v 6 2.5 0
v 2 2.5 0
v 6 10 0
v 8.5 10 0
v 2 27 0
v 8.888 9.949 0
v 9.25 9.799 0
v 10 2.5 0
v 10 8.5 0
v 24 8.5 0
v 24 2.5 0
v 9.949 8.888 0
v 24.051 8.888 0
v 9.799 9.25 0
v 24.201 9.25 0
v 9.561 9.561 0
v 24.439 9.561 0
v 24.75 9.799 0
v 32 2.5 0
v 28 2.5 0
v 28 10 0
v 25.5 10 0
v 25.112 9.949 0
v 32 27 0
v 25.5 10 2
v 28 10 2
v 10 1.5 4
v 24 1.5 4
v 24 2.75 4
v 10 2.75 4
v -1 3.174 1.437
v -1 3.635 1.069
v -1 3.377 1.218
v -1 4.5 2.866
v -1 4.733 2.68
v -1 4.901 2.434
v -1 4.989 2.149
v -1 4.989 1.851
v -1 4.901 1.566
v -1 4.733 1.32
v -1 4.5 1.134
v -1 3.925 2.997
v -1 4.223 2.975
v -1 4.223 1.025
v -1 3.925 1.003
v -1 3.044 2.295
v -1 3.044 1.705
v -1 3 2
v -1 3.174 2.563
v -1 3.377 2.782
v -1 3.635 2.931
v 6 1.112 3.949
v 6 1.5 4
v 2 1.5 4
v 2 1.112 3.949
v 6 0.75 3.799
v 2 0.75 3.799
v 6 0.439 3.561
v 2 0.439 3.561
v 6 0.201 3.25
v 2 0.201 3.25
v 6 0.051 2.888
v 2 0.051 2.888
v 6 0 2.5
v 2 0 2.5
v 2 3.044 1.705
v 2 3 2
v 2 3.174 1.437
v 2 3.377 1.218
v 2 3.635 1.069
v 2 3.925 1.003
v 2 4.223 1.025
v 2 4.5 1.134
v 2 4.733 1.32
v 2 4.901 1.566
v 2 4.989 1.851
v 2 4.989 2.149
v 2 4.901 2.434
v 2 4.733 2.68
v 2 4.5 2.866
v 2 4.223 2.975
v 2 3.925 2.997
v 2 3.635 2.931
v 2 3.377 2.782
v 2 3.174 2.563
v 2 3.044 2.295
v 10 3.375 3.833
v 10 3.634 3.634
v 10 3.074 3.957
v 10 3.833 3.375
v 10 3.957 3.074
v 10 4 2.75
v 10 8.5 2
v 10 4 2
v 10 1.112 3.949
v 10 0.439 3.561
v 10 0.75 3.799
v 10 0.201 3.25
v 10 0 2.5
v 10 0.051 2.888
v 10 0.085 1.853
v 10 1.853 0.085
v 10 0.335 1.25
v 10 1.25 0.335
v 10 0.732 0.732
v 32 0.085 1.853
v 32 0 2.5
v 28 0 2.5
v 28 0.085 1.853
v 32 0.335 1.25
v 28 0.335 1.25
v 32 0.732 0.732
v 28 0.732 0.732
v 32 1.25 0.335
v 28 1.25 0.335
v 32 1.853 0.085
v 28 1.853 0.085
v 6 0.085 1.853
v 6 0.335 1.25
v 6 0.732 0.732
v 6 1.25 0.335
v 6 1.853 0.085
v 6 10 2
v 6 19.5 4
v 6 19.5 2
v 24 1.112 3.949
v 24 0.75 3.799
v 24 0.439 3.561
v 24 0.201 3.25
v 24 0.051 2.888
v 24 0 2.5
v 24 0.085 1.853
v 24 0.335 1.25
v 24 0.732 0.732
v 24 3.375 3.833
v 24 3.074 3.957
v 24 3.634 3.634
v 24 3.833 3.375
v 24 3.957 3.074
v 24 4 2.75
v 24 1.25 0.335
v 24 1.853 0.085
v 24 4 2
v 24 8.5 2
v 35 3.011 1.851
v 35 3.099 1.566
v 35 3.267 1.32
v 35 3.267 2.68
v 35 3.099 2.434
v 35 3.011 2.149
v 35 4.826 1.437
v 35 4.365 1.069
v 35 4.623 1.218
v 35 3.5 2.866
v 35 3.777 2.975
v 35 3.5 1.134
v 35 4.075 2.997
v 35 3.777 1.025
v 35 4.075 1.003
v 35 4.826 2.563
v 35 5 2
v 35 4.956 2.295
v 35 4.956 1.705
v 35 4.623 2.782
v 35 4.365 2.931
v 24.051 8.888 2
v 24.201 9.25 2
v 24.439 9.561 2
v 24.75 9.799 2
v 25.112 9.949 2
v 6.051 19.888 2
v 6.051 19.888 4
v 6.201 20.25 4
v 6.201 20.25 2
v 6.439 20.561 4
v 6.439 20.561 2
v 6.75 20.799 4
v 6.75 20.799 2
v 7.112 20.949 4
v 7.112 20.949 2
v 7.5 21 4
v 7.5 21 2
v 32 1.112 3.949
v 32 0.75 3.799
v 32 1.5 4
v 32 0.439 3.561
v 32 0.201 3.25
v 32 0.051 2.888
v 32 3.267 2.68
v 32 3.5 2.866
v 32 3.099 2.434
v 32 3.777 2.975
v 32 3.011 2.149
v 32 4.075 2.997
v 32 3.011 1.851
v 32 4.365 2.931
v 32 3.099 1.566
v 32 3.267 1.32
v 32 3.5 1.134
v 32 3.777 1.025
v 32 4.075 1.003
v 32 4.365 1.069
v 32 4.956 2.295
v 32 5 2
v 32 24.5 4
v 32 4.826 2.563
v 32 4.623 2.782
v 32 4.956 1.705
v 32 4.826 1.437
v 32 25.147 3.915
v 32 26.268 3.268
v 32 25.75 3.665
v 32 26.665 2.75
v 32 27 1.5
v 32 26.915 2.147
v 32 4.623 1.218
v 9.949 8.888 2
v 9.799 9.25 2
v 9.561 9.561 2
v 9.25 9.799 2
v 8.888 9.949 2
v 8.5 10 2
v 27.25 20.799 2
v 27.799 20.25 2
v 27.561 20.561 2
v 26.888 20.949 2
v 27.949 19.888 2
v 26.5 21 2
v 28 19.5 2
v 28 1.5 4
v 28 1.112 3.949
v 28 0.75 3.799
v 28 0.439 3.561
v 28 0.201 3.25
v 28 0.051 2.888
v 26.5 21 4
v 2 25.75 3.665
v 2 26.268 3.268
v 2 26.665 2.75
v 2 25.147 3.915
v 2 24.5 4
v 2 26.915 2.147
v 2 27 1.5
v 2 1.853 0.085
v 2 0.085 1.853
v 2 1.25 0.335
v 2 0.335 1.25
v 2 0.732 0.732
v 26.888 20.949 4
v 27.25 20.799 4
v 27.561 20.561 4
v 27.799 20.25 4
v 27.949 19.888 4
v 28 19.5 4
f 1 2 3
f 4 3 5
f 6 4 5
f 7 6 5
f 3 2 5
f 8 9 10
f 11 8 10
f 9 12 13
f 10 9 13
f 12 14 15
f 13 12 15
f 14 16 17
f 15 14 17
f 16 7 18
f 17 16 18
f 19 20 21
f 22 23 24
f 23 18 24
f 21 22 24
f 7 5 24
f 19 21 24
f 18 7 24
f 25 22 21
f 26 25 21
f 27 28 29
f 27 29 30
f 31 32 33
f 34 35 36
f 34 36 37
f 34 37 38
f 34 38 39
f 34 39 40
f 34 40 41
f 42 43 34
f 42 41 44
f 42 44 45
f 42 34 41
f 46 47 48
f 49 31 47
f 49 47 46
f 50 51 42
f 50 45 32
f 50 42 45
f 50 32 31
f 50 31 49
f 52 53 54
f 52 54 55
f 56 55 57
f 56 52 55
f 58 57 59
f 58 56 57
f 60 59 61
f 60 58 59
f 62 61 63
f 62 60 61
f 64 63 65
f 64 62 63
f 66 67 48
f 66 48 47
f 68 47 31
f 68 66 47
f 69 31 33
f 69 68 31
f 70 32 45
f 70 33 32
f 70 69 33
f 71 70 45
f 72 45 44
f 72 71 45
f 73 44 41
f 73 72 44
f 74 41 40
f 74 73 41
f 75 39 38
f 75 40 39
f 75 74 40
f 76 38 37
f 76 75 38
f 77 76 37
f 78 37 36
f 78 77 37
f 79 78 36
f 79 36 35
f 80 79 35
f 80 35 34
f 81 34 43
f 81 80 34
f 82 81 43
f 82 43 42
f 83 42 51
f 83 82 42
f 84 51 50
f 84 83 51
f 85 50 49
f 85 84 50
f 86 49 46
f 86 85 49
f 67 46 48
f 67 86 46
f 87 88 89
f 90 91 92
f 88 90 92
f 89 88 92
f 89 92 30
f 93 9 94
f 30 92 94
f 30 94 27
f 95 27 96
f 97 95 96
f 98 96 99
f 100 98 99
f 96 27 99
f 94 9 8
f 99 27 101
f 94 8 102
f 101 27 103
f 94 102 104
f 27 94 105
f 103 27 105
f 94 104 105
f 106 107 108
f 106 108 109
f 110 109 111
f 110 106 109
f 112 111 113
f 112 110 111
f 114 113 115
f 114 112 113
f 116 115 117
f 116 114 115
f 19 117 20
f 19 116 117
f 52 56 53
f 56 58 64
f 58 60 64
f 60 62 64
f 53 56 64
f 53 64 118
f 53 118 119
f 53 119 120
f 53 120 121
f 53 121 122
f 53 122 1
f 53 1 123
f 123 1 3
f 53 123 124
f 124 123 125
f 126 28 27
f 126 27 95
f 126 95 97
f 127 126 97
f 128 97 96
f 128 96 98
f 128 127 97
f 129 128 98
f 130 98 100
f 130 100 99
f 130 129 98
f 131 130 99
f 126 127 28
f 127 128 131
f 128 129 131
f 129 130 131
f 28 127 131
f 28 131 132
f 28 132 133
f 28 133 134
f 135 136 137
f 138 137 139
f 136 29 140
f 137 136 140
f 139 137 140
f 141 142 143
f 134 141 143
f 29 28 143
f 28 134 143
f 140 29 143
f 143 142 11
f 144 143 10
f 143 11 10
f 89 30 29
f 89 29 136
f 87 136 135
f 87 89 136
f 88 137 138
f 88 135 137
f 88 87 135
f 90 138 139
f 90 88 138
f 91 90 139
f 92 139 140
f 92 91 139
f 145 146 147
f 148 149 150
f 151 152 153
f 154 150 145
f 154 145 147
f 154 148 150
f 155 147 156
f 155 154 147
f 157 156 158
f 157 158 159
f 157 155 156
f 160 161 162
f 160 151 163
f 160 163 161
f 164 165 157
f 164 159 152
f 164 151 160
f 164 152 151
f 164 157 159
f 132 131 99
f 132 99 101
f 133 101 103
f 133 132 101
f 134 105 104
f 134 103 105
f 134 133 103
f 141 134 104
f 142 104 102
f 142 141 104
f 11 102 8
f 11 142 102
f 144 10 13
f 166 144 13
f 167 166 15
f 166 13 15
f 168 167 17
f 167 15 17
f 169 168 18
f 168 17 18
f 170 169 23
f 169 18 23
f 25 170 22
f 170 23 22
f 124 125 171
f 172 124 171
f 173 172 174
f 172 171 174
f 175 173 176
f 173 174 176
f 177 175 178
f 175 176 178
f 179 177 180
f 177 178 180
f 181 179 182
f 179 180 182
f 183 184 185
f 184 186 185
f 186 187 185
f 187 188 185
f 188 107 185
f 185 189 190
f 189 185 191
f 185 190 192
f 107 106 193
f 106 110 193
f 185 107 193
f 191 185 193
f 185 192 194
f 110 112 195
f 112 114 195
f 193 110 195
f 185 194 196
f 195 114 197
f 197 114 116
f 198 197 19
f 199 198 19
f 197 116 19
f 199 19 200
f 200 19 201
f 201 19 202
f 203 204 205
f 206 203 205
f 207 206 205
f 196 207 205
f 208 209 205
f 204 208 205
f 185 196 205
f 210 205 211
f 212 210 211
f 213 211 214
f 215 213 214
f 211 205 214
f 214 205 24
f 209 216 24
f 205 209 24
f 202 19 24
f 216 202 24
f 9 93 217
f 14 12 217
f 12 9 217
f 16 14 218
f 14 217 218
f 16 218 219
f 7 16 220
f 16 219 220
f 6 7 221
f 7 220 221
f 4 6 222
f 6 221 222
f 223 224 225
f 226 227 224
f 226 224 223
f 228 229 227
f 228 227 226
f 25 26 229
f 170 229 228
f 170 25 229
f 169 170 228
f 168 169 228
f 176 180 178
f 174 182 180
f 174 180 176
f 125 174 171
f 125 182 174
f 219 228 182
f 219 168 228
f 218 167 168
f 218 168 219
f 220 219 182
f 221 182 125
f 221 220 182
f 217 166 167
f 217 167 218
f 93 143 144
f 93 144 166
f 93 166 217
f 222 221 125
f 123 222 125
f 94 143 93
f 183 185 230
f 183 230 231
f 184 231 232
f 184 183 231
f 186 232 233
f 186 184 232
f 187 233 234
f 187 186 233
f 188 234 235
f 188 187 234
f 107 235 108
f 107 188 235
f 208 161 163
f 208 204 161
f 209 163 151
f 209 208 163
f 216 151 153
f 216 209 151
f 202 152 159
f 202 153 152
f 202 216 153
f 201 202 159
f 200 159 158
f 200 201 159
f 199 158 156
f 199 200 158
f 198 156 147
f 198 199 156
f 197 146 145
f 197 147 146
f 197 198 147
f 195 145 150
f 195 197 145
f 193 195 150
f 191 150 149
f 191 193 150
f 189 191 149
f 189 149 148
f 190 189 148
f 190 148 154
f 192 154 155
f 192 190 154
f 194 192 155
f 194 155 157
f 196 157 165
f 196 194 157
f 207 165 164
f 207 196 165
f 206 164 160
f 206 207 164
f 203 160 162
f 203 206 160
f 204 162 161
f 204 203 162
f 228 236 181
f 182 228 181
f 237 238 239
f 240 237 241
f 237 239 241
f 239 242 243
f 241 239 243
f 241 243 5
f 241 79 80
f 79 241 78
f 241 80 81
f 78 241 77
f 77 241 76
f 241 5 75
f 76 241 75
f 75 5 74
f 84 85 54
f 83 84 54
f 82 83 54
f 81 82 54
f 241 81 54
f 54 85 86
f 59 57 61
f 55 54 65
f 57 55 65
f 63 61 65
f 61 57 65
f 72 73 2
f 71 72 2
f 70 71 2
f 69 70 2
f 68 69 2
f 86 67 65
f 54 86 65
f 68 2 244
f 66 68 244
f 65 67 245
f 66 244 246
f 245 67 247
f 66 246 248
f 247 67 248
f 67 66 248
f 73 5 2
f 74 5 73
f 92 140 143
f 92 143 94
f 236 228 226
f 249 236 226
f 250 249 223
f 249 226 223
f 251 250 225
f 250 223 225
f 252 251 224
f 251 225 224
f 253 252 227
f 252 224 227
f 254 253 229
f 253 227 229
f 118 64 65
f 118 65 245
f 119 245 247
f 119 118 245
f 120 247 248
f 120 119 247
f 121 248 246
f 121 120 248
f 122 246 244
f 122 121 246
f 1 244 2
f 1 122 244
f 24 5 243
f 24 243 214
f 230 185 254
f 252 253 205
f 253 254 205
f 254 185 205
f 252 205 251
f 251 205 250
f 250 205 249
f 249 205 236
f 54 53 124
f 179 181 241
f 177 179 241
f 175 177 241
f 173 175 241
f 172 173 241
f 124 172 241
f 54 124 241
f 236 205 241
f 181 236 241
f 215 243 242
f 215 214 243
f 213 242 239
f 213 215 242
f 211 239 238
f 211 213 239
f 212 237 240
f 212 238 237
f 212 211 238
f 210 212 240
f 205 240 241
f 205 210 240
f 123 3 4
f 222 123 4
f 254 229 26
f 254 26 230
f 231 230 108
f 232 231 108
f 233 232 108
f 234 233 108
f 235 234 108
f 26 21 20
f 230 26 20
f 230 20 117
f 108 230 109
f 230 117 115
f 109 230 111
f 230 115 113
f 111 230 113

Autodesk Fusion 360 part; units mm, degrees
sketch "Sketch1" plane through (0, 0, 0) normal (0, 0, 1) x (1, 0, 0)
  line L0 (0, 0) -> (2, 0)
  line L1 (2, 0) -> (6, 0)
  line L2 (6, 0) -> (6, 10)
  line L3 (6, 10) -> (10, 10)
  line L4 (10, 10) -> (10, 0)
  line L5 (10, 0) -> (24, 0)
  line L6 (24, 0) -> (24, 10)
  line L7 (24, 10) -> (28, 10)
  line L8 (28, 10) -> (28, 0)
  line L9 (28, 0) -> (32, 0)
  line L10 (32, 0) -> (34, 0)
  line L11 (34, 0) -> (34, 2)
  line L12 (34, 2) -> (32, 2)
  line L13 (32, 2) -> (32, 27)
  line L14 (0, 0) -> (0, 2)
  line L15 (0, 2) -> (2, 2)
  line L16 (2, 2) -> (2, 27)
  line L17 (2, 27) -> (32, 27)
  line L18 (2, 2) -> (2, 0)
  line L19 (32, 2) -> (32, 0)
  dimension "d1" = 2
  dimension "d2" = 4
  dimension "d3" = 10
  dimension "d4" = 4
  dimension "d5" = 14
  dimension "d6" = 4
  dimension "d7" = 4
  dimension "d8" = 2
  dimension "d9" = 2
  dimension "d10" = 2
  dimension "d11" = 25
  dimension "d12" = 2
  dimension "d13" = 2
  dimension "d14" = 25
  dimension "d43" = 30
extrude "Extrude1" add sketch "Sketch1" along normal blind 4 contours L1 L2 L3 L4 L5 L6 L7 L8 L9 L13 L16 L17 L18 L19
sketch "Sketch2" plane through (32, 0, 0) normal (1, 0, 0) x (0, 1, 0)
  line L0 (0, 0) -> (27, 0)
  line L1 (27, 0) -> (27, 4)
  line L2 (27, 4) -> (0, 4)
  line L3 (0, 4) -> (0, 0)
  circle A0 centre (4, 2) radius 1
  dimension "d17" = 2
  dimension "d56" = 2
  dimension "d57" = 4
sketch "Sketch3" plane through (32, 0, 0) normal (1, 0, 0) x (0, 1, 0)
  line L0 (0, 4) -> (0, 0)
  line L1 (0, 4) -> (0, 2)
  line L2 (0, 2) -> (4.8814, 2)
  point P0 (0, 4)
extrude "Extrude2" add sketch "Sketch2" along normal blind 3 contours A0
sketch "Sketch4" plane through (2, 0, 0) normal (-1, 0, 0) x (0, -1, 0)
  line L0 (-27, 0) -> (0, 0)
  line L1 (0, 0) -> (0, 4)
  line L2 (0, 4) -> (-27, 4)
  line L3 (-27, 4) -> (-27, 0)
  circle A0 centre (-4, 2) radius 1
  line L4 (0, 0) -> (0, 2)
  dimension "d20" = 2
  dimension "d54" = 2
  dimension "d55" = 4
extrude "Extrude3" add sketch "Sketch4" along normal blind 3 contours A0
fillet "Fillet1" radius 2.5 1 edges at (17, 27, 4)
sketch "Sketch5" plane through (0, 0, 4) normal (0, 0, 1) x (-1, 0, 0)
  line L0 (-32, -24.5) -> (-2, -24.5)
  line L1 (-2, -24.5) -> (-2, 0)
  line L2 (-2, 0) -> (-6, 0)
  line L3 (-6, 0) -> (-6, -10)
  line L4 (-6, -10) -> (-10, -10)
  line L5 (-10, -10) -> (-10, 0)
  line L6 (-10, 0) -> (-24, 0)
  line L7 (-24, 0) -> (-24, -10)
  line L8 (-24, -10) -> (-28, -10)
  line L9 (-28, -10) -> (-28, 0)
  line L10 (-28, 0) -> (-32, 0)
  line L11 (-32, 0) -> (-32, -24.5)
  line L12 (-28, -6.2874) -> (-16.9, -6.2874)
  line L13 (-16.9, -6.2874) -> (-16.9, -24.5)
  line L14 (-16.9, -24.5) -> (-28, -24.5)
  line L15 (-28, -24.5) -> (-28, -6.2874)
extrude "Extrude4" cut sketch "Sketch5" against normal blind 2 contours L0 L7 L8 L12 L13 L14 L15
fillet "Fillet2" radius 1.5 1 edges at (17, 0, 4)
fillet "Fillet3" radius 1.5 1 edges at (4, 0, 4)
fillet "Fillet4" radius 1.5 1 edges at (30, 0, 4)
sketch "Sketch6" plane through (0, 0, 2) normal (0, 0, 1) x (-1, 0, 0)
  line L0 (-16.9, -6.2874) -> (-24, -6.2874)
  line L1 (-24, -6.2874) -> (-24, -10)
  line L2 (-24, -10) -> (-28, -10)
  line L3 (-28, -10) -> (-28, -24.5)
  line L4 (-28, -24.5) -> (-16.9, -24.5)
  line L5 (-16.9, -24.5) -> (-16.9, -6.2874)
  line L6 (-28, -24.5) -> (-3.7012, -24.5)
  line L7 (-3.7012, -24.5) -> (-3.7012, -19.6935)
  line L8 (-28, -19.6935) -> (-28, -24.5)
extrude "Extrude6" add sketch "Sketch6" along normal blind 2
fillet "Fillet9" radius 1.5 2 edges at (10, 10, 2) (24, 10, 2)
extrude "Extrude5" add sketch "Sketch6" along normal blind 2
sketch "Sketch7" plane through (0, 0, 4) normal (0, 0, 1) x (-1, 0, 0)
  line L0 (-28, -10) -> (-28, -1.5)
  line L1 (-28, -1.5) -> (-32, -1.5)
  line L2 (-32, -1.5) -> (-32, -24.5)
  line L3 (-32, -24.5) -> (-2, -24.5)
  line L4 (-2, -24.5) -> (-2, -1.5)
  line L5 (-2, -1.5) -> (-6, -1.5)
  line L6 (-6, -1.5) -> (-6, -10)
  line L7 (-6, -10) -> (-8.5, -10)
  arc A0 (-10, -8.5) -> (-8.5, -10) centre (-8.5, -8.5) ccw
  line L8 (-10, -8.5) -> (-10, -1.5)
  line L9 (-10, -1.5) -> (-24, -1.5)
  line L10 (-24, -1.5) -> (-24, -8.5)
  arc A1 (-25.5, -10) -> (-24, -8.5) centre (-25.5, -8.5) ccw
  line L11 (-25.5, -10) -> (-28, -10)
  line L12 (-24, -4) -> (-10, -4)
  line L13 (-28, -10) -> (-28, -22)
  line L14 (-28, -22) -> (-6, -22)
  line L15 (-6, -22) -> (-6, -10)
extrude "Extrude7" cut sketch "Sketch7" against normal blind 2 contours L7 A0 L8 L10 A1 L11 L12 L13 L14 L15
extrude "Extrude8" add 1 faces at (20.6667, 22, 3.3333) along direction (0, -1, 0) blind 1
fillet "Fillet10" radius 1.5 2 edges at (6, 21, 3) (28, 21, 3)
fillet "Fillet11" radius 2.5 3 edges at (17, 0, 0) (4, 0, 0) (30, 0, 0)
fillet "Fillet12" radius 1.25 1 edges at (17, 4, 4)
